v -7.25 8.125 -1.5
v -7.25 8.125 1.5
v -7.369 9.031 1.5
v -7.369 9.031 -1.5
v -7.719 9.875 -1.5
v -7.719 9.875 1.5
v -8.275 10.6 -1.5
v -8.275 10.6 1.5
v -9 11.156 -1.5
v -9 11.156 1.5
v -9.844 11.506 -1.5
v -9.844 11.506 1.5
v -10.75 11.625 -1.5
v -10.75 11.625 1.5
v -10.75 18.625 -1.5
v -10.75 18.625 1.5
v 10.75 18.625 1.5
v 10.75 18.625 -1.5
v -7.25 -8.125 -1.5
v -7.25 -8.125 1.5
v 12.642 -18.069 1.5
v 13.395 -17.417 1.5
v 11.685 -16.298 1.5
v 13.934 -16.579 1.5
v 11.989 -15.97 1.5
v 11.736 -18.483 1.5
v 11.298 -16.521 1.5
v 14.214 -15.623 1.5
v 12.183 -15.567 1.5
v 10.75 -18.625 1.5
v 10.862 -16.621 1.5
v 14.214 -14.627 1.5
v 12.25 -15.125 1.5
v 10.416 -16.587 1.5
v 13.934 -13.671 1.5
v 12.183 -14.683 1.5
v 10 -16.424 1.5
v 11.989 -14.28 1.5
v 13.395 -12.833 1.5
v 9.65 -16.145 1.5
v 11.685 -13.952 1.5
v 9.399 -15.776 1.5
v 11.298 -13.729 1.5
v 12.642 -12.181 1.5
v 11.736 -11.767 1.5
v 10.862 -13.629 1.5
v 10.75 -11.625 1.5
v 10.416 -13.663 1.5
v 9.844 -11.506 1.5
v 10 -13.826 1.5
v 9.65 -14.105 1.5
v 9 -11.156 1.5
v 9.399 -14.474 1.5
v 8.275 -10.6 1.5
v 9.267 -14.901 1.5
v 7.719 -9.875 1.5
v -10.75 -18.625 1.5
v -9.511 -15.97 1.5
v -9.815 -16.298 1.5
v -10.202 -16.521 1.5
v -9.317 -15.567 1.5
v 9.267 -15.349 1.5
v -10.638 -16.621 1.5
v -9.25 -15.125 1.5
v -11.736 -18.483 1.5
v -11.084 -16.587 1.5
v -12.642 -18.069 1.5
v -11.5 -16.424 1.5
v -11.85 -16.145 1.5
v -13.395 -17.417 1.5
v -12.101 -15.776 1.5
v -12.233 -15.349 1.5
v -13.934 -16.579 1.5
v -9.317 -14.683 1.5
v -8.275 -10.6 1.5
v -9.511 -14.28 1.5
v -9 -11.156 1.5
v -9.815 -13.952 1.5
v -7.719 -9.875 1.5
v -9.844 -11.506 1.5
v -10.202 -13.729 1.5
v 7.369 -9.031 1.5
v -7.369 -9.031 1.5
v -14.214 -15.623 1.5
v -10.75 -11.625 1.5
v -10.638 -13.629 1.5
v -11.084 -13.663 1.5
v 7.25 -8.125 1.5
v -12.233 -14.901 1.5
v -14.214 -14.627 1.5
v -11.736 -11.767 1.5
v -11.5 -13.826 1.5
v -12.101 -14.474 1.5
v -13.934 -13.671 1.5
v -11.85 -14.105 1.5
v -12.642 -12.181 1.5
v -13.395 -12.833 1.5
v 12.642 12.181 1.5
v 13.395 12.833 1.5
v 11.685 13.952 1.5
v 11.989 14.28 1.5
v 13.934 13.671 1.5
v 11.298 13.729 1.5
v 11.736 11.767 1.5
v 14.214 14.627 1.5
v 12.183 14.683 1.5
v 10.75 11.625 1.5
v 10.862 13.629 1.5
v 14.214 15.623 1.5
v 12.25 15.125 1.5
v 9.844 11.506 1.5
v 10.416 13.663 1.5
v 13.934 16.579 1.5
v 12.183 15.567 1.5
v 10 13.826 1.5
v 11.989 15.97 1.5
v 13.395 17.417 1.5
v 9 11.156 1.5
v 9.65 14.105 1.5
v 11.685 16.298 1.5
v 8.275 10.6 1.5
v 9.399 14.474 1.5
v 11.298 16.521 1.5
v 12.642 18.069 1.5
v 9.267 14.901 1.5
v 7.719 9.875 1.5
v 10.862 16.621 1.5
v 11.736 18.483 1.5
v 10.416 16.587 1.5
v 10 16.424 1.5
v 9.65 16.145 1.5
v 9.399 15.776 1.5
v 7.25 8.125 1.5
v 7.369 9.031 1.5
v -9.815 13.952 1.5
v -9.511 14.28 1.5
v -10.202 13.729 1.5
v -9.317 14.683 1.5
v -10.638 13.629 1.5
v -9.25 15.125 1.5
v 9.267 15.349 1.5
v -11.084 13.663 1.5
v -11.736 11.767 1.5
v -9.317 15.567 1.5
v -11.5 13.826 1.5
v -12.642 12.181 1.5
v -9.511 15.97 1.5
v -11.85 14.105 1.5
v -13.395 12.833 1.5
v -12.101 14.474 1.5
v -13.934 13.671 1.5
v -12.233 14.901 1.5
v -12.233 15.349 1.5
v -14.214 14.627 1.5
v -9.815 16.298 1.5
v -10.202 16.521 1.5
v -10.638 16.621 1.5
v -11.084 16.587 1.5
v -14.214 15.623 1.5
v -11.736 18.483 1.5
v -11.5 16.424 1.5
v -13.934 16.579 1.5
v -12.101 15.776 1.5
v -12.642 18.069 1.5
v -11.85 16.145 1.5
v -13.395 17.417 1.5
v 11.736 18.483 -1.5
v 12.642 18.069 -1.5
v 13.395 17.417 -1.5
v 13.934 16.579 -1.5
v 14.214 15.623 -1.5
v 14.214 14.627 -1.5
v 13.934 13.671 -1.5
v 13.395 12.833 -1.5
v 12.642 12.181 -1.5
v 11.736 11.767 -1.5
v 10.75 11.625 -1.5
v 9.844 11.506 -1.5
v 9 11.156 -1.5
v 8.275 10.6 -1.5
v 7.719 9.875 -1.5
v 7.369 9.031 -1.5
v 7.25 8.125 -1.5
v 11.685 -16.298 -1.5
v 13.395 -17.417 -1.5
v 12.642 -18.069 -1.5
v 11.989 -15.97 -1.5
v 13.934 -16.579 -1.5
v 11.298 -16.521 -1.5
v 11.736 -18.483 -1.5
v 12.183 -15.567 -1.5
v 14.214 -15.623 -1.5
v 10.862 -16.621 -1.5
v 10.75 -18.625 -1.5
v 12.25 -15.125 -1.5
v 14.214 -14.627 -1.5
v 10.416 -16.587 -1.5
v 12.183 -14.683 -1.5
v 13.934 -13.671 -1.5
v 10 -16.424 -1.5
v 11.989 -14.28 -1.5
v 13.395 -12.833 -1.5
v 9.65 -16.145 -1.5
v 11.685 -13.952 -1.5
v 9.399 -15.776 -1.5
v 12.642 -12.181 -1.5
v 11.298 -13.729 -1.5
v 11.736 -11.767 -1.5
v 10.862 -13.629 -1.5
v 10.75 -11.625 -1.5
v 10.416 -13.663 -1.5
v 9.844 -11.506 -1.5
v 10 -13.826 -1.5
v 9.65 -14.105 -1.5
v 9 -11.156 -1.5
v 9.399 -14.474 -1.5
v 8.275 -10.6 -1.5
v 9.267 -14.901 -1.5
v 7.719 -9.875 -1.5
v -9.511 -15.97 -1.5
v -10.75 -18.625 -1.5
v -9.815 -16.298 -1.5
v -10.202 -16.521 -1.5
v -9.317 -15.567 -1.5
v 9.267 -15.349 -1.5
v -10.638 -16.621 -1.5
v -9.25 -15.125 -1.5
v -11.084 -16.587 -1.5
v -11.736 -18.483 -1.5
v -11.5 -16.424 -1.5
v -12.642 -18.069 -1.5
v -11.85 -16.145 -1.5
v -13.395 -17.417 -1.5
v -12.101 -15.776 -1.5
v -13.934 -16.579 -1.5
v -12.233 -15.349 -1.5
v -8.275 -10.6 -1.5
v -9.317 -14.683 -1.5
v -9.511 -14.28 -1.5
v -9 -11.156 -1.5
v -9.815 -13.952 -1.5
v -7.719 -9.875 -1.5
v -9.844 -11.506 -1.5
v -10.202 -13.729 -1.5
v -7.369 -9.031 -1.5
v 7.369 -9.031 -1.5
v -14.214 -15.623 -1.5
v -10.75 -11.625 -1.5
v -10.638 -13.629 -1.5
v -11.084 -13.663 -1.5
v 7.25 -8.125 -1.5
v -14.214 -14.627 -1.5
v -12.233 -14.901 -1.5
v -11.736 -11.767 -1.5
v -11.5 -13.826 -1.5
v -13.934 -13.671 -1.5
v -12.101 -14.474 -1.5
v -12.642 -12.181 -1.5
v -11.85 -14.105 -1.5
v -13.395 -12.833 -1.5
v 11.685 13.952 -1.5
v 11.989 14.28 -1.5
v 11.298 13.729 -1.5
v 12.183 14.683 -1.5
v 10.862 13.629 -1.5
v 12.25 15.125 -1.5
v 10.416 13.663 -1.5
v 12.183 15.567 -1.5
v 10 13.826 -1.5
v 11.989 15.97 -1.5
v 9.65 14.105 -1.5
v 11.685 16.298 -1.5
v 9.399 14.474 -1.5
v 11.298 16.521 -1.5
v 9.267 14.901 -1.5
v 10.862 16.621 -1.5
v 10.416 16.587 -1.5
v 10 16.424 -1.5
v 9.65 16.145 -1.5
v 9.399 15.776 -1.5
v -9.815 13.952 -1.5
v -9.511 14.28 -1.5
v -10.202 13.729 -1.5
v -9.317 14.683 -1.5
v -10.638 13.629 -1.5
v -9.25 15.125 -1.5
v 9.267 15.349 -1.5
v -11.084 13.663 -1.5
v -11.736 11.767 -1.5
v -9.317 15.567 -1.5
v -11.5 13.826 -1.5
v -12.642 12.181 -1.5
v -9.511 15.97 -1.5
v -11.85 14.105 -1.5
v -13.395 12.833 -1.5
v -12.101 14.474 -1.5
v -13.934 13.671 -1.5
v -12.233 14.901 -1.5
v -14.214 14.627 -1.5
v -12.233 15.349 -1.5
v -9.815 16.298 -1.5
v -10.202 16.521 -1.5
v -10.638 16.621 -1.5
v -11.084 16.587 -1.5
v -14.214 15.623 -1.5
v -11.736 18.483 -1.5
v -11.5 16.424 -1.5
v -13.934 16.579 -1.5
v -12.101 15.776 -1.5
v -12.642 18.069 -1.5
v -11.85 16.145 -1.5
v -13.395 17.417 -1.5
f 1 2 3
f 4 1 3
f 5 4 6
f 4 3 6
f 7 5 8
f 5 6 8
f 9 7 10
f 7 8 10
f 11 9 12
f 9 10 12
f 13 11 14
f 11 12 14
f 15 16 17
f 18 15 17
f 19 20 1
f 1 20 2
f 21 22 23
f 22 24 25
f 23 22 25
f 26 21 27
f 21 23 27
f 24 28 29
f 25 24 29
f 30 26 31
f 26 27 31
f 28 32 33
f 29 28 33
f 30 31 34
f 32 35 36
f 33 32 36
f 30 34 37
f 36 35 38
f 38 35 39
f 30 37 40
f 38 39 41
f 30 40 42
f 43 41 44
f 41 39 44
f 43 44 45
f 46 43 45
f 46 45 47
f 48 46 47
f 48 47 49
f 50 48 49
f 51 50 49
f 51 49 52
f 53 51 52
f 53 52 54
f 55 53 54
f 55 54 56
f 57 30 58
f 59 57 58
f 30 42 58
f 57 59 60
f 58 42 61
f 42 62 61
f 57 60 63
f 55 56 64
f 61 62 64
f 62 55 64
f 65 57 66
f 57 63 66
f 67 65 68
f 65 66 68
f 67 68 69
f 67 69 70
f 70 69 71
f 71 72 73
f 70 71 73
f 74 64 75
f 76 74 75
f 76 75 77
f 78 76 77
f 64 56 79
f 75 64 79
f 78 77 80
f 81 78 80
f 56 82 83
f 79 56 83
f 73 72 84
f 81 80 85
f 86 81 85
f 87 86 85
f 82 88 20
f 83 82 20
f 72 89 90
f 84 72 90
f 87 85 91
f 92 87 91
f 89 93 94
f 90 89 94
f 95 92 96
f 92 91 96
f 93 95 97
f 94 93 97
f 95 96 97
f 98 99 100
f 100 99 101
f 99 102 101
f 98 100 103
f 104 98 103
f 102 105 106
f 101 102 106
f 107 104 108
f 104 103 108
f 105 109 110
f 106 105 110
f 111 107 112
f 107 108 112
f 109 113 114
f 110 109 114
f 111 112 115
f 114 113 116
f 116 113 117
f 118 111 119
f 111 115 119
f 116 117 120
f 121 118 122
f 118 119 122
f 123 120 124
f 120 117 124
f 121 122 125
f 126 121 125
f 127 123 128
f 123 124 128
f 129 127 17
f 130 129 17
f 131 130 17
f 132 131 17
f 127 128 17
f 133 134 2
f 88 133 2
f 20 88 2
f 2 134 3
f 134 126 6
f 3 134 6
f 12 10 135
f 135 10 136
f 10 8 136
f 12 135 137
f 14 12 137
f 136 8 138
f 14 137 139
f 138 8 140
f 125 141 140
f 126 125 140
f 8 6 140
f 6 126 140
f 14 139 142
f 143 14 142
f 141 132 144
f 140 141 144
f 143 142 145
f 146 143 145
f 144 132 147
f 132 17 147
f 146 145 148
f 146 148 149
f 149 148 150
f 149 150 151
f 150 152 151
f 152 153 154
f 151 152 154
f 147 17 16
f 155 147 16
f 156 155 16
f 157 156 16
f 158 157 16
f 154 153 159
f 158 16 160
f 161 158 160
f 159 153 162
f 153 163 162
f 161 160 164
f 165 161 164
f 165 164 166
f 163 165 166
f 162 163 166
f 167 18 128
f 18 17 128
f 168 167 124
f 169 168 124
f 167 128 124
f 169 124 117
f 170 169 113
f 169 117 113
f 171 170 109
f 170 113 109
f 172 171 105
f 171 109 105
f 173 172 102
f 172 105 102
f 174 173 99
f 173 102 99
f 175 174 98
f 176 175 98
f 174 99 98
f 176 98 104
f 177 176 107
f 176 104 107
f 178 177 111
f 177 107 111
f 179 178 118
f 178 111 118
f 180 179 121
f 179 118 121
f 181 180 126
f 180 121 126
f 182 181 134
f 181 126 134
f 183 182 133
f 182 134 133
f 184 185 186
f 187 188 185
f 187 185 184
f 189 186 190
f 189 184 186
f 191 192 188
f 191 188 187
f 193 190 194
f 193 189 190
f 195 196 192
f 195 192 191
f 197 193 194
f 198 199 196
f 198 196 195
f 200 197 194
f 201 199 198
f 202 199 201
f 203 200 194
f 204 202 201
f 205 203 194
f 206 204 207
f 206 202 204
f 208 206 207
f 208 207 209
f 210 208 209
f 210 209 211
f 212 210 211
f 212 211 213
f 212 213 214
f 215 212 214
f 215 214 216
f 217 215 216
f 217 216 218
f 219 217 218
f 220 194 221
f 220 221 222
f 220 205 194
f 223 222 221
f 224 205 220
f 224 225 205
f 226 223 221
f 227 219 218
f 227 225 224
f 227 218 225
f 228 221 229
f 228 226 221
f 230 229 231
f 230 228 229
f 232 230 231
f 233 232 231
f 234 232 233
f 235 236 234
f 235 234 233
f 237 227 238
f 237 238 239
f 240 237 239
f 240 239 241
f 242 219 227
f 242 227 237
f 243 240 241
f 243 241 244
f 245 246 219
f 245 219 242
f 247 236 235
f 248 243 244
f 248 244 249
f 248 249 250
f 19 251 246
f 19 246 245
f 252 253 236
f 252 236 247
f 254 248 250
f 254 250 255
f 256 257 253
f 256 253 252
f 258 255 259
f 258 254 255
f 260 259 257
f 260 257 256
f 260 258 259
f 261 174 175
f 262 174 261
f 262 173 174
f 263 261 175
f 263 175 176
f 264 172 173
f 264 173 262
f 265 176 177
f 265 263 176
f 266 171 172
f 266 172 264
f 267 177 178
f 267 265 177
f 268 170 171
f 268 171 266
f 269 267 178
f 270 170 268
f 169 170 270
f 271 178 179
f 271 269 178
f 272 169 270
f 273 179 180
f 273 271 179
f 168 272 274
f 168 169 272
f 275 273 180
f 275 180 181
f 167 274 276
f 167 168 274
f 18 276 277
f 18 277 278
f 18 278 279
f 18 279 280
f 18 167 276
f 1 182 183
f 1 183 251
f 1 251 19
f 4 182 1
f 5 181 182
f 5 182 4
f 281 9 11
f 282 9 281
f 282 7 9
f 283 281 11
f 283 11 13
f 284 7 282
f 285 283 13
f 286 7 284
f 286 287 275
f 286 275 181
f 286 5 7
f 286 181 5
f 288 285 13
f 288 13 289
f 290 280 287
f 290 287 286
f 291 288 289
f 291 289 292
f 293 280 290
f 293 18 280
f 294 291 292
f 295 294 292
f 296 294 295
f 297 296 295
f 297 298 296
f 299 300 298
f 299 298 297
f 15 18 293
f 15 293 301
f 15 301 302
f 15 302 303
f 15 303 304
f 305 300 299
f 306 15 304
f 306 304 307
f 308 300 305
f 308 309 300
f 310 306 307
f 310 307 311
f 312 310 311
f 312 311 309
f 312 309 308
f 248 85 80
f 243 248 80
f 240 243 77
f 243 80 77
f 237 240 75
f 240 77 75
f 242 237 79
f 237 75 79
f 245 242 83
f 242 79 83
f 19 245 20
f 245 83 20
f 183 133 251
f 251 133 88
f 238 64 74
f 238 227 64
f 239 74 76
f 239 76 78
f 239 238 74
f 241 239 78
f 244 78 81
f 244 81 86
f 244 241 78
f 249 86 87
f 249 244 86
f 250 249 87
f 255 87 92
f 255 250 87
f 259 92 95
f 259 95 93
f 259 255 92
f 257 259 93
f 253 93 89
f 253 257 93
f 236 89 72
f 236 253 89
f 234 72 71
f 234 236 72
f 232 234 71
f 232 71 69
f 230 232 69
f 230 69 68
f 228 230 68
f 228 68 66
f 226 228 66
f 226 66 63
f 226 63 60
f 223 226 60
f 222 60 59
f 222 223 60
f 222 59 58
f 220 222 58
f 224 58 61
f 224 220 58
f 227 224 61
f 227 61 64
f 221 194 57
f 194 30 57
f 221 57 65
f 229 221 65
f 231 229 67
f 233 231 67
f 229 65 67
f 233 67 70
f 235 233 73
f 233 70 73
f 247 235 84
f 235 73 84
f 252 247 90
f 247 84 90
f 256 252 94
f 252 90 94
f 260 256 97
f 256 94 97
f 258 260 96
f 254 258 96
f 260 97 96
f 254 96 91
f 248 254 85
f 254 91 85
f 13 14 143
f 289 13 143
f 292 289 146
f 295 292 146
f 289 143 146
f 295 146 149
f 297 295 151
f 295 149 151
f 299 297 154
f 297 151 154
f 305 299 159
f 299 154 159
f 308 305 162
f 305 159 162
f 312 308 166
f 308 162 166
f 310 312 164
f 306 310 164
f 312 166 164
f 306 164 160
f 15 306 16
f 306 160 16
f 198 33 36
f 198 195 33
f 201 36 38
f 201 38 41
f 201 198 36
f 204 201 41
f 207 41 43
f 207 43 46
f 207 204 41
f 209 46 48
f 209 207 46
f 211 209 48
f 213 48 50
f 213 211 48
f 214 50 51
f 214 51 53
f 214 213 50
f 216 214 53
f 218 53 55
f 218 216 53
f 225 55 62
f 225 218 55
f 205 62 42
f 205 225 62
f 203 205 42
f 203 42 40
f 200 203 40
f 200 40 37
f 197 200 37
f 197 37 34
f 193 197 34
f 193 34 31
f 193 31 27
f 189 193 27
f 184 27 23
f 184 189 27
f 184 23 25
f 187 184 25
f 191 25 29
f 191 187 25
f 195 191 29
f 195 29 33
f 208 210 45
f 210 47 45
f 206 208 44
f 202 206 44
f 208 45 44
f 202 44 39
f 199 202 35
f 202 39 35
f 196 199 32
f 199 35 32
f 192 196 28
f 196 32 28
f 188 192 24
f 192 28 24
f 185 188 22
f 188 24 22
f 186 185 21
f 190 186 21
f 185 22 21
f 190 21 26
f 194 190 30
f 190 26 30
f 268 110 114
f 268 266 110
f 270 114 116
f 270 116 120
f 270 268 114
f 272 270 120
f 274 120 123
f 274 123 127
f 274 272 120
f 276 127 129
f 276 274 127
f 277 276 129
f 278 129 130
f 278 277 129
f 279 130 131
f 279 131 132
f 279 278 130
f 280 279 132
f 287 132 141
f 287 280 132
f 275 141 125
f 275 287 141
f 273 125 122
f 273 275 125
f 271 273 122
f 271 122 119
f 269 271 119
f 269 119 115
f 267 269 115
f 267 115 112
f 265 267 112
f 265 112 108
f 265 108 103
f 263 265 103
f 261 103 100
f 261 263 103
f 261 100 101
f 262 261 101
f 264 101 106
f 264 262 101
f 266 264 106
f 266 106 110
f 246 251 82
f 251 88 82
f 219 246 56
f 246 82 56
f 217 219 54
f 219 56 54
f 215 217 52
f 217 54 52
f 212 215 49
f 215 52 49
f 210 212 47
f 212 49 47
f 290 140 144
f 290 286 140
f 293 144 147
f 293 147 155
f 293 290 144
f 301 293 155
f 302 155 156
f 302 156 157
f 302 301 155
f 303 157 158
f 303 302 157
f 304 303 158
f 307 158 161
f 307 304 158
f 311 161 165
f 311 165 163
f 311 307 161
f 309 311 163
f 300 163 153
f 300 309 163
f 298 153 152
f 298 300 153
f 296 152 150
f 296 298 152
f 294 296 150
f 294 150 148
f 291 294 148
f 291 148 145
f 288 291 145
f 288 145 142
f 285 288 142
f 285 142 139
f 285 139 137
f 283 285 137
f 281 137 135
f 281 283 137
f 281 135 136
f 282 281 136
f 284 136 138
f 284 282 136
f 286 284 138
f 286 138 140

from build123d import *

# Parameters (mm, degrees)
SKETCH1_R           = 1.5
BOSS_EXTRUDE1_DEPTH = 1.5


with BuildPart() as part:
    # Sketch1 → Boss-Extrude1 (new body, symmetric)
    with BuildSketch(Plane.XY):
        with BuildLine():
            Line((-10.75, 18.625), (10.75, 18.625))
            ThreePointArc((10.75, 18.625), (14.25, 15.125), (10.75, 11.625))
            ThreePointArc((10.75, 11.625), (8.275126266, 10.599873734), (7.25, 8.125))
            Line((7.25, 8.125), (7.25, -8.125))
            ThreePointArc((7.25, -8.125), (8.275126266, -10.599873734), (10.75, -11.625))
            ThreePointArc((10.75, -11.625), (14.25, -15.125), (10.75, -18.625))
            Line((10.75, -18.625), (-10.75, -18.625))
            ThreePointArc((-10.75, -18.625), (-14.25, -15.125), (-10.75, -11.625))
            ThreePointArc((-10.75, -11.625), (-8.275126266, -10.599873734), (-7.25, -8.125))
            Line((-7.25, -8.125), (-7.25, 8.125))
            ThreePointArc((-7.25, 8.125), (-8.275126266, 10.599873734), (-10.75, 11.625))
            ThreePointArc((-10.75, 11.625), (-14.25, 15.125), (-10.75, 18.625))
        make_face()
        with Locations((-10.75, 15.125)):
            Circle(SKETCH1_R, mode=Mode.SUBTRACT)
        with Locations((10.75, 15.125)):
            Circle(SKETCH1_R, mode=Mode.SUBTRACT)
        with Locations((10.75, -15.125)):
            Circle(SKETCH1_R, mode=Mode.SUBTRACT)
        with Locations((-10.75, -15.125)):
            Circle(SKETCH1_R, mode=Mode.SUBTRACT)
    extrude(amount=BOSS_EXTRUDE1_DEPTH, both=True)


solid = part.part
